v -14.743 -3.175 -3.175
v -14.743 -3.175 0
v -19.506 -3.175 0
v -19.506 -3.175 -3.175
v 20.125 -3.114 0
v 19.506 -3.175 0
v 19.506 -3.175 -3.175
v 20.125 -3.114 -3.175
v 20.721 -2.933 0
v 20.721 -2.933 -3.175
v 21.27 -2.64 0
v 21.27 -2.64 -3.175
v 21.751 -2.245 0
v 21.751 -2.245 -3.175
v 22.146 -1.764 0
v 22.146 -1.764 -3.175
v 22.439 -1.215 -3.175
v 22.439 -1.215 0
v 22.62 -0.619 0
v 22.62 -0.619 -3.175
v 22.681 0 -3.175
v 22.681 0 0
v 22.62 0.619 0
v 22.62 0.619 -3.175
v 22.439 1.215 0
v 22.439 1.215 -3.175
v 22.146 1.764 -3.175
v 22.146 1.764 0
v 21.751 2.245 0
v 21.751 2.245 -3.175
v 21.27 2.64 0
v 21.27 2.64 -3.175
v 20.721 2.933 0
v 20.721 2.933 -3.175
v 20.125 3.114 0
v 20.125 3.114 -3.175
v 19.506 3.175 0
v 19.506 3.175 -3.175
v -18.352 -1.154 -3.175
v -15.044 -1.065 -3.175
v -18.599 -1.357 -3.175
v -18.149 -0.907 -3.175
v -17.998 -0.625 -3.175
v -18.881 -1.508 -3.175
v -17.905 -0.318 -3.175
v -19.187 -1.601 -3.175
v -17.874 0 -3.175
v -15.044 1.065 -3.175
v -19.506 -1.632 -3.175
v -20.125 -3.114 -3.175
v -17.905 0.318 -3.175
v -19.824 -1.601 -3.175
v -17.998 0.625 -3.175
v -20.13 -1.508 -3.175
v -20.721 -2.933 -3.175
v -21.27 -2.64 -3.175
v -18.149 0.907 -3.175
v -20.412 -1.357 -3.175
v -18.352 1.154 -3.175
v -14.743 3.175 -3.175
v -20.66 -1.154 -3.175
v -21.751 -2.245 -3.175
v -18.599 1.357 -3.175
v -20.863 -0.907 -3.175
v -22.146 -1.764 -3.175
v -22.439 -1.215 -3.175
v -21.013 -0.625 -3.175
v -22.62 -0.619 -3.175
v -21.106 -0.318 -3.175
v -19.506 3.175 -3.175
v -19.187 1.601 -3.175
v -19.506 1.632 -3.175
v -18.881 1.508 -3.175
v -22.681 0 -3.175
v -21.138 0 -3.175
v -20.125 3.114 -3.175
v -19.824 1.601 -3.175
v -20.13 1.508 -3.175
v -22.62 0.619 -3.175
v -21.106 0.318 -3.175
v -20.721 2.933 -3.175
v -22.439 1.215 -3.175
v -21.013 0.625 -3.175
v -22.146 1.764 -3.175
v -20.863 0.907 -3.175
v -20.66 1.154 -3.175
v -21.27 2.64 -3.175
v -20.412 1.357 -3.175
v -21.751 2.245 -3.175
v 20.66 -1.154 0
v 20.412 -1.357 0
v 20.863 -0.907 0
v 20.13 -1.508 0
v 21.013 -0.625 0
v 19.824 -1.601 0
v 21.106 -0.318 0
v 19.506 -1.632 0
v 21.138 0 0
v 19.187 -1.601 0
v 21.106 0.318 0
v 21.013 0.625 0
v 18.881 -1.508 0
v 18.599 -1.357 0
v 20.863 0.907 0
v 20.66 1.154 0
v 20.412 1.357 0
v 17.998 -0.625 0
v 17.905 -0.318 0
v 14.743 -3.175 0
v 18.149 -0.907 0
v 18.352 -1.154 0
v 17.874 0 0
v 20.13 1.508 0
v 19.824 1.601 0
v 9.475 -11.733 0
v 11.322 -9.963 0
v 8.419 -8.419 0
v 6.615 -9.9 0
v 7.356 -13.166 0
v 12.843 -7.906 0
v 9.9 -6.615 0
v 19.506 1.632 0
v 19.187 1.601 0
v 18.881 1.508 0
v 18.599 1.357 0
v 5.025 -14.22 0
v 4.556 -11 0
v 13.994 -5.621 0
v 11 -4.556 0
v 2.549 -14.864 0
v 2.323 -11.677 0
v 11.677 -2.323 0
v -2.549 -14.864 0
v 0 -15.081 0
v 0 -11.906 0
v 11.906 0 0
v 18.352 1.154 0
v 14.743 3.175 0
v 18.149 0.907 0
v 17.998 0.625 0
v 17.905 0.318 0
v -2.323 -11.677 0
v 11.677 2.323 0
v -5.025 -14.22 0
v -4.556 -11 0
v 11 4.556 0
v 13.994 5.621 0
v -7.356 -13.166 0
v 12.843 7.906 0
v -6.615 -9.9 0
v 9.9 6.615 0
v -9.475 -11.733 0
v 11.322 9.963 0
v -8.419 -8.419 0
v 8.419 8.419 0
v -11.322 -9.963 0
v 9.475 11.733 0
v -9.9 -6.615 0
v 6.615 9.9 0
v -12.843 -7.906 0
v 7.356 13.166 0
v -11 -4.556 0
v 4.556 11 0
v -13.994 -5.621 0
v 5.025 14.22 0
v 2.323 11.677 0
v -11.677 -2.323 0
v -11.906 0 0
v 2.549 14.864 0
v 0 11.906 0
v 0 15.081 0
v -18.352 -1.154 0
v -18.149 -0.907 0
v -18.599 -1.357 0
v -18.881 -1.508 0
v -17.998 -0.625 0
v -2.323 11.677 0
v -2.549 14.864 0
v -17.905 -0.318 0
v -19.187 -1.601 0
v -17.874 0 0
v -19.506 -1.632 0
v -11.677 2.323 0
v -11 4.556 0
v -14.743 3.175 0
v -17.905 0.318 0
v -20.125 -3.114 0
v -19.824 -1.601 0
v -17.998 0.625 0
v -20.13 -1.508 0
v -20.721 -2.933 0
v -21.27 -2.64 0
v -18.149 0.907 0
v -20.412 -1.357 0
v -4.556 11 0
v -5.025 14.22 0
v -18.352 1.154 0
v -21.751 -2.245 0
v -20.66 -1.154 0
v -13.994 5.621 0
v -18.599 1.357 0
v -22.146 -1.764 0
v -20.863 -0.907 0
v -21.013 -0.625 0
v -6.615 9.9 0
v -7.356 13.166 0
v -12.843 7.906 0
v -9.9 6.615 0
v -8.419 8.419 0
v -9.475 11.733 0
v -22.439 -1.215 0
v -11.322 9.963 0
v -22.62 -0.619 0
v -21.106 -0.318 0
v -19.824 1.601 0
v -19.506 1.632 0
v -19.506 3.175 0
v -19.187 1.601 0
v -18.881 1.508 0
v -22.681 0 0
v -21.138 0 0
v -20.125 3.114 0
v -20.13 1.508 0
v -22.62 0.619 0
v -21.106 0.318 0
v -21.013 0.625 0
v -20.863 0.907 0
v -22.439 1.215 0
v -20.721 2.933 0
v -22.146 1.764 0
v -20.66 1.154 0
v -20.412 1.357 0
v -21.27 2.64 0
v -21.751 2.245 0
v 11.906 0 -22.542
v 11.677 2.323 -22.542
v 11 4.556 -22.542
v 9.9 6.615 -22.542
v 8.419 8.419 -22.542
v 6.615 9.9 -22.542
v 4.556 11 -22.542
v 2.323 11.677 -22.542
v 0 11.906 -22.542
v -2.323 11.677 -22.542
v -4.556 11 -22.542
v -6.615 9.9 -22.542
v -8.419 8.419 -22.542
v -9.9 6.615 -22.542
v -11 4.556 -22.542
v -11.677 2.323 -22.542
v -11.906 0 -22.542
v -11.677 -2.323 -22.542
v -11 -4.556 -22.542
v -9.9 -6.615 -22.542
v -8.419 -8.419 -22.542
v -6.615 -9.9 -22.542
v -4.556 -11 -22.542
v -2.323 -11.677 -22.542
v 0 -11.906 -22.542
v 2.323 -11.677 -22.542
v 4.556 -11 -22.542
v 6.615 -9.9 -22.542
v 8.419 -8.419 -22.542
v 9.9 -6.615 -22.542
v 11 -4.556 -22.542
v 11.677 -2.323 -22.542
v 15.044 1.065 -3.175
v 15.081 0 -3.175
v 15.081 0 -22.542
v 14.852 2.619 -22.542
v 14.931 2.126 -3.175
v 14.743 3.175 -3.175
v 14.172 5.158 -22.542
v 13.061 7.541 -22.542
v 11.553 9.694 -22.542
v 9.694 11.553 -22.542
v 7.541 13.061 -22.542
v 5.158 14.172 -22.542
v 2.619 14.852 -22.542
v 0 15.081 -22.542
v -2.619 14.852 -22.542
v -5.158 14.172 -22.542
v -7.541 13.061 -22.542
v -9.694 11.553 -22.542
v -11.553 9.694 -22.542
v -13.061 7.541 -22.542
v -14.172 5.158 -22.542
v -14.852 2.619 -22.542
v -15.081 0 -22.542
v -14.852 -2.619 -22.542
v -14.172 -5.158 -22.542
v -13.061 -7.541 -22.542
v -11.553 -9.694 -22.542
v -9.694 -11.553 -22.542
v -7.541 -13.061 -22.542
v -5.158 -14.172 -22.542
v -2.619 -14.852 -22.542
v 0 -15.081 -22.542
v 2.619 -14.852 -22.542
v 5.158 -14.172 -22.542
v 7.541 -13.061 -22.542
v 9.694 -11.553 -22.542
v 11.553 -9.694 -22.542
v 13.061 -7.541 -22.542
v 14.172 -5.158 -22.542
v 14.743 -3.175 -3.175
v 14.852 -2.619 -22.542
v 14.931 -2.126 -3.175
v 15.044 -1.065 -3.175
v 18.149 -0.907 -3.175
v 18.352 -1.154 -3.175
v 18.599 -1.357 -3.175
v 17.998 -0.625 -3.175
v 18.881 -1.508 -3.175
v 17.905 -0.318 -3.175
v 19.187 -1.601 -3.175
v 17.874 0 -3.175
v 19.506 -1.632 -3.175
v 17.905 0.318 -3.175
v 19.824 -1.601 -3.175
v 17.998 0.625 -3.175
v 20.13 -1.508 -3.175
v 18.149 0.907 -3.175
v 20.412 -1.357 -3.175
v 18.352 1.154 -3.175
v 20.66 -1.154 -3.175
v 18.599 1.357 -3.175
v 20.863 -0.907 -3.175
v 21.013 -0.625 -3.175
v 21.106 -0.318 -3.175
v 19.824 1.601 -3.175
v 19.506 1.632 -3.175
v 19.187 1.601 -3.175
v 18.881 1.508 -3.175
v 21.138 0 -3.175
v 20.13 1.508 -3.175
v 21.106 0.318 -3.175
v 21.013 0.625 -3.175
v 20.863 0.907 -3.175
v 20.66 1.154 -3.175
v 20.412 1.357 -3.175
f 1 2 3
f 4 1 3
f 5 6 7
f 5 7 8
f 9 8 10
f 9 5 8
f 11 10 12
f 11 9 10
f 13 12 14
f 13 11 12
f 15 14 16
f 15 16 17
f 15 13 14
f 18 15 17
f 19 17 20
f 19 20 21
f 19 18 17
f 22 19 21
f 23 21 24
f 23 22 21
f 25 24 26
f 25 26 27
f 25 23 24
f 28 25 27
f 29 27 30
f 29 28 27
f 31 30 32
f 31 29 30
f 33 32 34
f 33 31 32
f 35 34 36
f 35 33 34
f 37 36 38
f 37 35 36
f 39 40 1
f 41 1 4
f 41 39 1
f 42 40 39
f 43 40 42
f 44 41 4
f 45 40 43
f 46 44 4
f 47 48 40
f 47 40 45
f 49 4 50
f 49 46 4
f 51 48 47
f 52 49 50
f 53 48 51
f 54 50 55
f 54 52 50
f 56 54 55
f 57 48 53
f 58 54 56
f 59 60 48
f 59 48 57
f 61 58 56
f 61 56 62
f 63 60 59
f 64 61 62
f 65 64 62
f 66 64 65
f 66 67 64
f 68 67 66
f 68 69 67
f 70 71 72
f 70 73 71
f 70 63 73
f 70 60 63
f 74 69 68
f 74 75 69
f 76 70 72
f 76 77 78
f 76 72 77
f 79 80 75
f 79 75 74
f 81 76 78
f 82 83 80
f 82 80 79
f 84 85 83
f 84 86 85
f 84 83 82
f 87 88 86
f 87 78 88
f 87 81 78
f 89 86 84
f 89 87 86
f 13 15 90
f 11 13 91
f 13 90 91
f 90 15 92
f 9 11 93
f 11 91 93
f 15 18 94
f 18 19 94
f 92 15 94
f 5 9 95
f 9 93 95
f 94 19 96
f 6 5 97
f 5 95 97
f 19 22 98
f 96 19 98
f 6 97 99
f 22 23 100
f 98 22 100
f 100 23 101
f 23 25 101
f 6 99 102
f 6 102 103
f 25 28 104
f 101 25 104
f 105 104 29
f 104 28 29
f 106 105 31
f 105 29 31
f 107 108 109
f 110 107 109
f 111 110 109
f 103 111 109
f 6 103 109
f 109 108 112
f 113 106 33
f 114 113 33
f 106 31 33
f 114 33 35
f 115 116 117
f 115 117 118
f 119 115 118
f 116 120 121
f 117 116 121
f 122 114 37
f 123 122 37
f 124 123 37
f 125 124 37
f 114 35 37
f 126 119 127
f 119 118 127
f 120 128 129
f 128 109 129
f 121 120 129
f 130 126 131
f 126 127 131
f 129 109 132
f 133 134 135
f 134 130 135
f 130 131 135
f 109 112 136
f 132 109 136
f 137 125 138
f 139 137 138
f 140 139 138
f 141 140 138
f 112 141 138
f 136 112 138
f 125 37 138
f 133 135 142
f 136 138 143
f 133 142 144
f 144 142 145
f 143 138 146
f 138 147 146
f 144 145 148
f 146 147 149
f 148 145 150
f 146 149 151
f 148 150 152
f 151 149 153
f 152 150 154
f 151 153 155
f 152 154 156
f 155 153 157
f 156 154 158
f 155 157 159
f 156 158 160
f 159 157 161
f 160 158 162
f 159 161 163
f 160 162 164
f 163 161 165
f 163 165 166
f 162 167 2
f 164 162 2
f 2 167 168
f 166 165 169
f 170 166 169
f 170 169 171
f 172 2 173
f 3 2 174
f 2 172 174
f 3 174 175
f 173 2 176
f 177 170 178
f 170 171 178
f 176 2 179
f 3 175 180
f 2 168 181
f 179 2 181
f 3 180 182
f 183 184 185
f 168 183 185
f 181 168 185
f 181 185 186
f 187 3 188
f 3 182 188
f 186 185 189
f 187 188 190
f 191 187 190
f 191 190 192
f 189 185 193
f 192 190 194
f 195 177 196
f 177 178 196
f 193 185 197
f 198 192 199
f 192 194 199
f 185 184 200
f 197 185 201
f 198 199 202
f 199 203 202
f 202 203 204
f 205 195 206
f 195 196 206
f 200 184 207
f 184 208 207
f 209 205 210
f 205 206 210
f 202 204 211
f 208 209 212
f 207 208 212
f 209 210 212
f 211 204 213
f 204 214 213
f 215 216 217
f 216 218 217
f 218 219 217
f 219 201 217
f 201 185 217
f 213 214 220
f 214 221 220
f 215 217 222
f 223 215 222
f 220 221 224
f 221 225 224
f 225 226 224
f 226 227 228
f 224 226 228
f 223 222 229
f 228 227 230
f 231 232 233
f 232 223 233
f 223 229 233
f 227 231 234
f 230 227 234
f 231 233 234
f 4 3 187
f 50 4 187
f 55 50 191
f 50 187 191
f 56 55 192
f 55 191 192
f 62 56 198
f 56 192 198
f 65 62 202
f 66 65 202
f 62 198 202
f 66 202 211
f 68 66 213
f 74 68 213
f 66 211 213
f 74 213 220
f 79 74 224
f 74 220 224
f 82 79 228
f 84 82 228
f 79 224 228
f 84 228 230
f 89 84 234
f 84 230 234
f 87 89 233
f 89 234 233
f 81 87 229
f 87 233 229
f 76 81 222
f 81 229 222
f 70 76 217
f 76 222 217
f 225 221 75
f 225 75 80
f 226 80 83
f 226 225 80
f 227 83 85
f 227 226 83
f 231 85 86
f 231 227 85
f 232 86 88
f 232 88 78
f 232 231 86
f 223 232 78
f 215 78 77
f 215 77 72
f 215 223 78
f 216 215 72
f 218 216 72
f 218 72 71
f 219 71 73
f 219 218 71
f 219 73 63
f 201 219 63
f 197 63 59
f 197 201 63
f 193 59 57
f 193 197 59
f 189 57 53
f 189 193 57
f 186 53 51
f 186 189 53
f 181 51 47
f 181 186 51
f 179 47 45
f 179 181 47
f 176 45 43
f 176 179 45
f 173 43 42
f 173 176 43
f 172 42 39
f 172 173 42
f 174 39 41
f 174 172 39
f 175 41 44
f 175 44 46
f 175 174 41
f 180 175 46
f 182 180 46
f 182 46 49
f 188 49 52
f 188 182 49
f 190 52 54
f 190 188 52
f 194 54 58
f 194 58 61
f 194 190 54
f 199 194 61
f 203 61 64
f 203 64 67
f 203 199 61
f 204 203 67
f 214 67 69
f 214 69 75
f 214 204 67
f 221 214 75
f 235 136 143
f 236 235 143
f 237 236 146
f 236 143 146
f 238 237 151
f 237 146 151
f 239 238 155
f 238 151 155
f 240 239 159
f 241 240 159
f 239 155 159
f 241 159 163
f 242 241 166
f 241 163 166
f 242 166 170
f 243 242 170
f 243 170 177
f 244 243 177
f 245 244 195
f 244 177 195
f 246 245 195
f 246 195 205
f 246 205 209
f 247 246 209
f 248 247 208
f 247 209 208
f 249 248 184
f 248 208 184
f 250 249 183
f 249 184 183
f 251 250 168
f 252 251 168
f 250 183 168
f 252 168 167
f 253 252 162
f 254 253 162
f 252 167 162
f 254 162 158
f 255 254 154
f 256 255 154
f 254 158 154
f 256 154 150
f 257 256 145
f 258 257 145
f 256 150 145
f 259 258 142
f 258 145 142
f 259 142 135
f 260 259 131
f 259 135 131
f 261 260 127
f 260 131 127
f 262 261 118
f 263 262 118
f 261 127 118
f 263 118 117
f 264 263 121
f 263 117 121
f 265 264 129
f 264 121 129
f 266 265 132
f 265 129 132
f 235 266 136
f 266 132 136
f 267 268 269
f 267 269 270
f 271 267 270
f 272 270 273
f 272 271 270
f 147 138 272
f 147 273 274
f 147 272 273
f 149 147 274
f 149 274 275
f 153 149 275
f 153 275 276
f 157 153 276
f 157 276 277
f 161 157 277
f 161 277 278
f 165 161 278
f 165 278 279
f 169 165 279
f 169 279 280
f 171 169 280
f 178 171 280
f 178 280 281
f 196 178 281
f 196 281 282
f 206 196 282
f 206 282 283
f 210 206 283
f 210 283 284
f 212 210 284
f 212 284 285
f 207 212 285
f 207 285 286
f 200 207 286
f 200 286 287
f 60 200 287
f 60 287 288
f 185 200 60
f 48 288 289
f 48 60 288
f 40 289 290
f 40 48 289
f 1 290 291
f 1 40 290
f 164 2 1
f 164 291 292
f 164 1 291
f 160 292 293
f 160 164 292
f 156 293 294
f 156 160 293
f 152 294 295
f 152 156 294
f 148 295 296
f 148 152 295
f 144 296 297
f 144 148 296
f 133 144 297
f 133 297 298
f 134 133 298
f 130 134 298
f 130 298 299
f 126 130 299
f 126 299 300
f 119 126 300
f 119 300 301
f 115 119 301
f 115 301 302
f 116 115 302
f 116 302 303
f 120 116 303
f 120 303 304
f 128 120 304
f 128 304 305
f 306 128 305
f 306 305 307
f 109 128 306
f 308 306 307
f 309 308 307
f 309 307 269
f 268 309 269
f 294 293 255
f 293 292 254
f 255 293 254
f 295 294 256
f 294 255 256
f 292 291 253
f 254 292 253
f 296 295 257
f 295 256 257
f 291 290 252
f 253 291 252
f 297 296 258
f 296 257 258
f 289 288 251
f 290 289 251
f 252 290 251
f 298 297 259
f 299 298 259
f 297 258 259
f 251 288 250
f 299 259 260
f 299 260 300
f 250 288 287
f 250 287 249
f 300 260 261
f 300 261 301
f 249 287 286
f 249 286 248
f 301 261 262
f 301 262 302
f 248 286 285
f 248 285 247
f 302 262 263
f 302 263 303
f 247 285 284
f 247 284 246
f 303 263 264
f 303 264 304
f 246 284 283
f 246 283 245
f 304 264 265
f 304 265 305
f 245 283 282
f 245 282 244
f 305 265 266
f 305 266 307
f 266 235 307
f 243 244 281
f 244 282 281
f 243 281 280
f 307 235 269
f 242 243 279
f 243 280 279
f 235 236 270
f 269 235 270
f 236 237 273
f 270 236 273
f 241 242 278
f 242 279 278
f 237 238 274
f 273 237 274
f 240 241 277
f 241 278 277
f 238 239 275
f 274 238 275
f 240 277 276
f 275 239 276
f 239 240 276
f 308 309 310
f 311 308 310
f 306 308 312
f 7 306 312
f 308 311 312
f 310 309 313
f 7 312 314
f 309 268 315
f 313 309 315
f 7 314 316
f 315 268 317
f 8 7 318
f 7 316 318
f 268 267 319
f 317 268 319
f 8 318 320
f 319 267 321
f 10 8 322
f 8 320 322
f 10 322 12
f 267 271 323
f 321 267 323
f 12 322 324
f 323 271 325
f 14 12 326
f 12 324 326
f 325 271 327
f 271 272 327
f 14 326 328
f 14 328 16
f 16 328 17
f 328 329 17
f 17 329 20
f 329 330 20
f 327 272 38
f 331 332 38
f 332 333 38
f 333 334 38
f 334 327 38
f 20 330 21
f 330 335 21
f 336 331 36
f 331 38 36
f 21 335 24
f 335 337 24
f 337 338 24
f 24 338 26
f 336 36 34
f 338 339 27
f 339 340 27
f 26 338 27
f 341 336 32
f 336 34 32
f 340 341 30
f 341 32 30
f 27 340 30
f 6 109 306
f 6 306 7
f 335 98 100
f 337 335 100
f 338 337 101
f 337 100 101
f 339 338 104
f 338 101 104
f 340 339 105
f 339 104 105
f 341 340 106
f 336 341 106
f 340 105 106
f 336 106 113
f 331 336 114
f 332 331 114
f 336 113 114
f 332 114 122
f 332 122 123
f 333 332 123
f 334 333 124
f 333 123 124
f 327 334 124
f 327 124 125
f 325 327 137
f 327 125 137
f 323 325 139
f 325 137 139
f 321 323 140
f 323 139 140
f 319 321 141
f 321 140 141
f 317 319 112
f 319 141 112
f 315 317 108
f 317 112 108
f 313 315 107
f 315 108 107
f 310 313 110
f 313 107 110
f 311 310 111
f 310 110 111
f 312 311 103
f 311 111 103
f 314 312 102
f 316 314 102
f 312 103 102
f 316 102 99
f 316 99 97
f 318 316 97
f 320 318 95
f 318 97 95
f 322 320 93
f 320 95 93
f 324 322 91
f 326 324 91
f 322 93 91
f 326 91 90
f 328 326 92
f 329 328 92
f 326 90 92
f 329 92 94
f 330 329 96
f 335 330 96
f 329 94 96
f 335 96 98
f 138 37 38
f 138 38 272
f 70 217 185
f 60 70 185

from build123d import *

# Parameters (mm, degrees)
F0_R     = 15.08125
F0_R_2   = 11.90625
F1_DEPTH = 22.5425
F2_R     = 1.63195
F3_DEPTH = 3.175


# Not quite as in the source:
# - a pattern or mirror of a feature is missing from the dataset's text; its kind, count and spacing are read off the source's solid


with BuildPart() as f1:
    # F0 (on Top) → F1 (new body)
    with BuildSketch(Plane.XY):
        Circle(F0_R)
        Circle(F0_R_2, mode=Mode.SUBTRACT)
    extrude(amount=-F1_DEPTH)

    # F2 (on Top) → F3 (join)
    with BuildSketch(Plane.XY):
        with BuildLine():
            Line((19.5057518992, 3.175), (14.7432518992, 3.175))
            Line((14.7432518992, 3.175), (14.7432518992, -3.175))
            Line((14.7432518992, -3.175), (19.5057518992, -3.175))
            ThreePointArc((19.5057518992, -3.175), (22.6807518992, 0), (19.5057518992, 3.175))
        make_face()
        with Locations((19.5057518992, 0)):
            Circle(F2_R, mode=Mode.SUBTRACT)
    f3 = extrude(amount=-F3_DEPTH)

    # F3_copies: F3 across plane
    add(f3.mirror(Plane(origin=(0, 0, 0), x_dir=(0, 0, -1), z_dir=(-1, 0, 0))))


solid = f1.part
